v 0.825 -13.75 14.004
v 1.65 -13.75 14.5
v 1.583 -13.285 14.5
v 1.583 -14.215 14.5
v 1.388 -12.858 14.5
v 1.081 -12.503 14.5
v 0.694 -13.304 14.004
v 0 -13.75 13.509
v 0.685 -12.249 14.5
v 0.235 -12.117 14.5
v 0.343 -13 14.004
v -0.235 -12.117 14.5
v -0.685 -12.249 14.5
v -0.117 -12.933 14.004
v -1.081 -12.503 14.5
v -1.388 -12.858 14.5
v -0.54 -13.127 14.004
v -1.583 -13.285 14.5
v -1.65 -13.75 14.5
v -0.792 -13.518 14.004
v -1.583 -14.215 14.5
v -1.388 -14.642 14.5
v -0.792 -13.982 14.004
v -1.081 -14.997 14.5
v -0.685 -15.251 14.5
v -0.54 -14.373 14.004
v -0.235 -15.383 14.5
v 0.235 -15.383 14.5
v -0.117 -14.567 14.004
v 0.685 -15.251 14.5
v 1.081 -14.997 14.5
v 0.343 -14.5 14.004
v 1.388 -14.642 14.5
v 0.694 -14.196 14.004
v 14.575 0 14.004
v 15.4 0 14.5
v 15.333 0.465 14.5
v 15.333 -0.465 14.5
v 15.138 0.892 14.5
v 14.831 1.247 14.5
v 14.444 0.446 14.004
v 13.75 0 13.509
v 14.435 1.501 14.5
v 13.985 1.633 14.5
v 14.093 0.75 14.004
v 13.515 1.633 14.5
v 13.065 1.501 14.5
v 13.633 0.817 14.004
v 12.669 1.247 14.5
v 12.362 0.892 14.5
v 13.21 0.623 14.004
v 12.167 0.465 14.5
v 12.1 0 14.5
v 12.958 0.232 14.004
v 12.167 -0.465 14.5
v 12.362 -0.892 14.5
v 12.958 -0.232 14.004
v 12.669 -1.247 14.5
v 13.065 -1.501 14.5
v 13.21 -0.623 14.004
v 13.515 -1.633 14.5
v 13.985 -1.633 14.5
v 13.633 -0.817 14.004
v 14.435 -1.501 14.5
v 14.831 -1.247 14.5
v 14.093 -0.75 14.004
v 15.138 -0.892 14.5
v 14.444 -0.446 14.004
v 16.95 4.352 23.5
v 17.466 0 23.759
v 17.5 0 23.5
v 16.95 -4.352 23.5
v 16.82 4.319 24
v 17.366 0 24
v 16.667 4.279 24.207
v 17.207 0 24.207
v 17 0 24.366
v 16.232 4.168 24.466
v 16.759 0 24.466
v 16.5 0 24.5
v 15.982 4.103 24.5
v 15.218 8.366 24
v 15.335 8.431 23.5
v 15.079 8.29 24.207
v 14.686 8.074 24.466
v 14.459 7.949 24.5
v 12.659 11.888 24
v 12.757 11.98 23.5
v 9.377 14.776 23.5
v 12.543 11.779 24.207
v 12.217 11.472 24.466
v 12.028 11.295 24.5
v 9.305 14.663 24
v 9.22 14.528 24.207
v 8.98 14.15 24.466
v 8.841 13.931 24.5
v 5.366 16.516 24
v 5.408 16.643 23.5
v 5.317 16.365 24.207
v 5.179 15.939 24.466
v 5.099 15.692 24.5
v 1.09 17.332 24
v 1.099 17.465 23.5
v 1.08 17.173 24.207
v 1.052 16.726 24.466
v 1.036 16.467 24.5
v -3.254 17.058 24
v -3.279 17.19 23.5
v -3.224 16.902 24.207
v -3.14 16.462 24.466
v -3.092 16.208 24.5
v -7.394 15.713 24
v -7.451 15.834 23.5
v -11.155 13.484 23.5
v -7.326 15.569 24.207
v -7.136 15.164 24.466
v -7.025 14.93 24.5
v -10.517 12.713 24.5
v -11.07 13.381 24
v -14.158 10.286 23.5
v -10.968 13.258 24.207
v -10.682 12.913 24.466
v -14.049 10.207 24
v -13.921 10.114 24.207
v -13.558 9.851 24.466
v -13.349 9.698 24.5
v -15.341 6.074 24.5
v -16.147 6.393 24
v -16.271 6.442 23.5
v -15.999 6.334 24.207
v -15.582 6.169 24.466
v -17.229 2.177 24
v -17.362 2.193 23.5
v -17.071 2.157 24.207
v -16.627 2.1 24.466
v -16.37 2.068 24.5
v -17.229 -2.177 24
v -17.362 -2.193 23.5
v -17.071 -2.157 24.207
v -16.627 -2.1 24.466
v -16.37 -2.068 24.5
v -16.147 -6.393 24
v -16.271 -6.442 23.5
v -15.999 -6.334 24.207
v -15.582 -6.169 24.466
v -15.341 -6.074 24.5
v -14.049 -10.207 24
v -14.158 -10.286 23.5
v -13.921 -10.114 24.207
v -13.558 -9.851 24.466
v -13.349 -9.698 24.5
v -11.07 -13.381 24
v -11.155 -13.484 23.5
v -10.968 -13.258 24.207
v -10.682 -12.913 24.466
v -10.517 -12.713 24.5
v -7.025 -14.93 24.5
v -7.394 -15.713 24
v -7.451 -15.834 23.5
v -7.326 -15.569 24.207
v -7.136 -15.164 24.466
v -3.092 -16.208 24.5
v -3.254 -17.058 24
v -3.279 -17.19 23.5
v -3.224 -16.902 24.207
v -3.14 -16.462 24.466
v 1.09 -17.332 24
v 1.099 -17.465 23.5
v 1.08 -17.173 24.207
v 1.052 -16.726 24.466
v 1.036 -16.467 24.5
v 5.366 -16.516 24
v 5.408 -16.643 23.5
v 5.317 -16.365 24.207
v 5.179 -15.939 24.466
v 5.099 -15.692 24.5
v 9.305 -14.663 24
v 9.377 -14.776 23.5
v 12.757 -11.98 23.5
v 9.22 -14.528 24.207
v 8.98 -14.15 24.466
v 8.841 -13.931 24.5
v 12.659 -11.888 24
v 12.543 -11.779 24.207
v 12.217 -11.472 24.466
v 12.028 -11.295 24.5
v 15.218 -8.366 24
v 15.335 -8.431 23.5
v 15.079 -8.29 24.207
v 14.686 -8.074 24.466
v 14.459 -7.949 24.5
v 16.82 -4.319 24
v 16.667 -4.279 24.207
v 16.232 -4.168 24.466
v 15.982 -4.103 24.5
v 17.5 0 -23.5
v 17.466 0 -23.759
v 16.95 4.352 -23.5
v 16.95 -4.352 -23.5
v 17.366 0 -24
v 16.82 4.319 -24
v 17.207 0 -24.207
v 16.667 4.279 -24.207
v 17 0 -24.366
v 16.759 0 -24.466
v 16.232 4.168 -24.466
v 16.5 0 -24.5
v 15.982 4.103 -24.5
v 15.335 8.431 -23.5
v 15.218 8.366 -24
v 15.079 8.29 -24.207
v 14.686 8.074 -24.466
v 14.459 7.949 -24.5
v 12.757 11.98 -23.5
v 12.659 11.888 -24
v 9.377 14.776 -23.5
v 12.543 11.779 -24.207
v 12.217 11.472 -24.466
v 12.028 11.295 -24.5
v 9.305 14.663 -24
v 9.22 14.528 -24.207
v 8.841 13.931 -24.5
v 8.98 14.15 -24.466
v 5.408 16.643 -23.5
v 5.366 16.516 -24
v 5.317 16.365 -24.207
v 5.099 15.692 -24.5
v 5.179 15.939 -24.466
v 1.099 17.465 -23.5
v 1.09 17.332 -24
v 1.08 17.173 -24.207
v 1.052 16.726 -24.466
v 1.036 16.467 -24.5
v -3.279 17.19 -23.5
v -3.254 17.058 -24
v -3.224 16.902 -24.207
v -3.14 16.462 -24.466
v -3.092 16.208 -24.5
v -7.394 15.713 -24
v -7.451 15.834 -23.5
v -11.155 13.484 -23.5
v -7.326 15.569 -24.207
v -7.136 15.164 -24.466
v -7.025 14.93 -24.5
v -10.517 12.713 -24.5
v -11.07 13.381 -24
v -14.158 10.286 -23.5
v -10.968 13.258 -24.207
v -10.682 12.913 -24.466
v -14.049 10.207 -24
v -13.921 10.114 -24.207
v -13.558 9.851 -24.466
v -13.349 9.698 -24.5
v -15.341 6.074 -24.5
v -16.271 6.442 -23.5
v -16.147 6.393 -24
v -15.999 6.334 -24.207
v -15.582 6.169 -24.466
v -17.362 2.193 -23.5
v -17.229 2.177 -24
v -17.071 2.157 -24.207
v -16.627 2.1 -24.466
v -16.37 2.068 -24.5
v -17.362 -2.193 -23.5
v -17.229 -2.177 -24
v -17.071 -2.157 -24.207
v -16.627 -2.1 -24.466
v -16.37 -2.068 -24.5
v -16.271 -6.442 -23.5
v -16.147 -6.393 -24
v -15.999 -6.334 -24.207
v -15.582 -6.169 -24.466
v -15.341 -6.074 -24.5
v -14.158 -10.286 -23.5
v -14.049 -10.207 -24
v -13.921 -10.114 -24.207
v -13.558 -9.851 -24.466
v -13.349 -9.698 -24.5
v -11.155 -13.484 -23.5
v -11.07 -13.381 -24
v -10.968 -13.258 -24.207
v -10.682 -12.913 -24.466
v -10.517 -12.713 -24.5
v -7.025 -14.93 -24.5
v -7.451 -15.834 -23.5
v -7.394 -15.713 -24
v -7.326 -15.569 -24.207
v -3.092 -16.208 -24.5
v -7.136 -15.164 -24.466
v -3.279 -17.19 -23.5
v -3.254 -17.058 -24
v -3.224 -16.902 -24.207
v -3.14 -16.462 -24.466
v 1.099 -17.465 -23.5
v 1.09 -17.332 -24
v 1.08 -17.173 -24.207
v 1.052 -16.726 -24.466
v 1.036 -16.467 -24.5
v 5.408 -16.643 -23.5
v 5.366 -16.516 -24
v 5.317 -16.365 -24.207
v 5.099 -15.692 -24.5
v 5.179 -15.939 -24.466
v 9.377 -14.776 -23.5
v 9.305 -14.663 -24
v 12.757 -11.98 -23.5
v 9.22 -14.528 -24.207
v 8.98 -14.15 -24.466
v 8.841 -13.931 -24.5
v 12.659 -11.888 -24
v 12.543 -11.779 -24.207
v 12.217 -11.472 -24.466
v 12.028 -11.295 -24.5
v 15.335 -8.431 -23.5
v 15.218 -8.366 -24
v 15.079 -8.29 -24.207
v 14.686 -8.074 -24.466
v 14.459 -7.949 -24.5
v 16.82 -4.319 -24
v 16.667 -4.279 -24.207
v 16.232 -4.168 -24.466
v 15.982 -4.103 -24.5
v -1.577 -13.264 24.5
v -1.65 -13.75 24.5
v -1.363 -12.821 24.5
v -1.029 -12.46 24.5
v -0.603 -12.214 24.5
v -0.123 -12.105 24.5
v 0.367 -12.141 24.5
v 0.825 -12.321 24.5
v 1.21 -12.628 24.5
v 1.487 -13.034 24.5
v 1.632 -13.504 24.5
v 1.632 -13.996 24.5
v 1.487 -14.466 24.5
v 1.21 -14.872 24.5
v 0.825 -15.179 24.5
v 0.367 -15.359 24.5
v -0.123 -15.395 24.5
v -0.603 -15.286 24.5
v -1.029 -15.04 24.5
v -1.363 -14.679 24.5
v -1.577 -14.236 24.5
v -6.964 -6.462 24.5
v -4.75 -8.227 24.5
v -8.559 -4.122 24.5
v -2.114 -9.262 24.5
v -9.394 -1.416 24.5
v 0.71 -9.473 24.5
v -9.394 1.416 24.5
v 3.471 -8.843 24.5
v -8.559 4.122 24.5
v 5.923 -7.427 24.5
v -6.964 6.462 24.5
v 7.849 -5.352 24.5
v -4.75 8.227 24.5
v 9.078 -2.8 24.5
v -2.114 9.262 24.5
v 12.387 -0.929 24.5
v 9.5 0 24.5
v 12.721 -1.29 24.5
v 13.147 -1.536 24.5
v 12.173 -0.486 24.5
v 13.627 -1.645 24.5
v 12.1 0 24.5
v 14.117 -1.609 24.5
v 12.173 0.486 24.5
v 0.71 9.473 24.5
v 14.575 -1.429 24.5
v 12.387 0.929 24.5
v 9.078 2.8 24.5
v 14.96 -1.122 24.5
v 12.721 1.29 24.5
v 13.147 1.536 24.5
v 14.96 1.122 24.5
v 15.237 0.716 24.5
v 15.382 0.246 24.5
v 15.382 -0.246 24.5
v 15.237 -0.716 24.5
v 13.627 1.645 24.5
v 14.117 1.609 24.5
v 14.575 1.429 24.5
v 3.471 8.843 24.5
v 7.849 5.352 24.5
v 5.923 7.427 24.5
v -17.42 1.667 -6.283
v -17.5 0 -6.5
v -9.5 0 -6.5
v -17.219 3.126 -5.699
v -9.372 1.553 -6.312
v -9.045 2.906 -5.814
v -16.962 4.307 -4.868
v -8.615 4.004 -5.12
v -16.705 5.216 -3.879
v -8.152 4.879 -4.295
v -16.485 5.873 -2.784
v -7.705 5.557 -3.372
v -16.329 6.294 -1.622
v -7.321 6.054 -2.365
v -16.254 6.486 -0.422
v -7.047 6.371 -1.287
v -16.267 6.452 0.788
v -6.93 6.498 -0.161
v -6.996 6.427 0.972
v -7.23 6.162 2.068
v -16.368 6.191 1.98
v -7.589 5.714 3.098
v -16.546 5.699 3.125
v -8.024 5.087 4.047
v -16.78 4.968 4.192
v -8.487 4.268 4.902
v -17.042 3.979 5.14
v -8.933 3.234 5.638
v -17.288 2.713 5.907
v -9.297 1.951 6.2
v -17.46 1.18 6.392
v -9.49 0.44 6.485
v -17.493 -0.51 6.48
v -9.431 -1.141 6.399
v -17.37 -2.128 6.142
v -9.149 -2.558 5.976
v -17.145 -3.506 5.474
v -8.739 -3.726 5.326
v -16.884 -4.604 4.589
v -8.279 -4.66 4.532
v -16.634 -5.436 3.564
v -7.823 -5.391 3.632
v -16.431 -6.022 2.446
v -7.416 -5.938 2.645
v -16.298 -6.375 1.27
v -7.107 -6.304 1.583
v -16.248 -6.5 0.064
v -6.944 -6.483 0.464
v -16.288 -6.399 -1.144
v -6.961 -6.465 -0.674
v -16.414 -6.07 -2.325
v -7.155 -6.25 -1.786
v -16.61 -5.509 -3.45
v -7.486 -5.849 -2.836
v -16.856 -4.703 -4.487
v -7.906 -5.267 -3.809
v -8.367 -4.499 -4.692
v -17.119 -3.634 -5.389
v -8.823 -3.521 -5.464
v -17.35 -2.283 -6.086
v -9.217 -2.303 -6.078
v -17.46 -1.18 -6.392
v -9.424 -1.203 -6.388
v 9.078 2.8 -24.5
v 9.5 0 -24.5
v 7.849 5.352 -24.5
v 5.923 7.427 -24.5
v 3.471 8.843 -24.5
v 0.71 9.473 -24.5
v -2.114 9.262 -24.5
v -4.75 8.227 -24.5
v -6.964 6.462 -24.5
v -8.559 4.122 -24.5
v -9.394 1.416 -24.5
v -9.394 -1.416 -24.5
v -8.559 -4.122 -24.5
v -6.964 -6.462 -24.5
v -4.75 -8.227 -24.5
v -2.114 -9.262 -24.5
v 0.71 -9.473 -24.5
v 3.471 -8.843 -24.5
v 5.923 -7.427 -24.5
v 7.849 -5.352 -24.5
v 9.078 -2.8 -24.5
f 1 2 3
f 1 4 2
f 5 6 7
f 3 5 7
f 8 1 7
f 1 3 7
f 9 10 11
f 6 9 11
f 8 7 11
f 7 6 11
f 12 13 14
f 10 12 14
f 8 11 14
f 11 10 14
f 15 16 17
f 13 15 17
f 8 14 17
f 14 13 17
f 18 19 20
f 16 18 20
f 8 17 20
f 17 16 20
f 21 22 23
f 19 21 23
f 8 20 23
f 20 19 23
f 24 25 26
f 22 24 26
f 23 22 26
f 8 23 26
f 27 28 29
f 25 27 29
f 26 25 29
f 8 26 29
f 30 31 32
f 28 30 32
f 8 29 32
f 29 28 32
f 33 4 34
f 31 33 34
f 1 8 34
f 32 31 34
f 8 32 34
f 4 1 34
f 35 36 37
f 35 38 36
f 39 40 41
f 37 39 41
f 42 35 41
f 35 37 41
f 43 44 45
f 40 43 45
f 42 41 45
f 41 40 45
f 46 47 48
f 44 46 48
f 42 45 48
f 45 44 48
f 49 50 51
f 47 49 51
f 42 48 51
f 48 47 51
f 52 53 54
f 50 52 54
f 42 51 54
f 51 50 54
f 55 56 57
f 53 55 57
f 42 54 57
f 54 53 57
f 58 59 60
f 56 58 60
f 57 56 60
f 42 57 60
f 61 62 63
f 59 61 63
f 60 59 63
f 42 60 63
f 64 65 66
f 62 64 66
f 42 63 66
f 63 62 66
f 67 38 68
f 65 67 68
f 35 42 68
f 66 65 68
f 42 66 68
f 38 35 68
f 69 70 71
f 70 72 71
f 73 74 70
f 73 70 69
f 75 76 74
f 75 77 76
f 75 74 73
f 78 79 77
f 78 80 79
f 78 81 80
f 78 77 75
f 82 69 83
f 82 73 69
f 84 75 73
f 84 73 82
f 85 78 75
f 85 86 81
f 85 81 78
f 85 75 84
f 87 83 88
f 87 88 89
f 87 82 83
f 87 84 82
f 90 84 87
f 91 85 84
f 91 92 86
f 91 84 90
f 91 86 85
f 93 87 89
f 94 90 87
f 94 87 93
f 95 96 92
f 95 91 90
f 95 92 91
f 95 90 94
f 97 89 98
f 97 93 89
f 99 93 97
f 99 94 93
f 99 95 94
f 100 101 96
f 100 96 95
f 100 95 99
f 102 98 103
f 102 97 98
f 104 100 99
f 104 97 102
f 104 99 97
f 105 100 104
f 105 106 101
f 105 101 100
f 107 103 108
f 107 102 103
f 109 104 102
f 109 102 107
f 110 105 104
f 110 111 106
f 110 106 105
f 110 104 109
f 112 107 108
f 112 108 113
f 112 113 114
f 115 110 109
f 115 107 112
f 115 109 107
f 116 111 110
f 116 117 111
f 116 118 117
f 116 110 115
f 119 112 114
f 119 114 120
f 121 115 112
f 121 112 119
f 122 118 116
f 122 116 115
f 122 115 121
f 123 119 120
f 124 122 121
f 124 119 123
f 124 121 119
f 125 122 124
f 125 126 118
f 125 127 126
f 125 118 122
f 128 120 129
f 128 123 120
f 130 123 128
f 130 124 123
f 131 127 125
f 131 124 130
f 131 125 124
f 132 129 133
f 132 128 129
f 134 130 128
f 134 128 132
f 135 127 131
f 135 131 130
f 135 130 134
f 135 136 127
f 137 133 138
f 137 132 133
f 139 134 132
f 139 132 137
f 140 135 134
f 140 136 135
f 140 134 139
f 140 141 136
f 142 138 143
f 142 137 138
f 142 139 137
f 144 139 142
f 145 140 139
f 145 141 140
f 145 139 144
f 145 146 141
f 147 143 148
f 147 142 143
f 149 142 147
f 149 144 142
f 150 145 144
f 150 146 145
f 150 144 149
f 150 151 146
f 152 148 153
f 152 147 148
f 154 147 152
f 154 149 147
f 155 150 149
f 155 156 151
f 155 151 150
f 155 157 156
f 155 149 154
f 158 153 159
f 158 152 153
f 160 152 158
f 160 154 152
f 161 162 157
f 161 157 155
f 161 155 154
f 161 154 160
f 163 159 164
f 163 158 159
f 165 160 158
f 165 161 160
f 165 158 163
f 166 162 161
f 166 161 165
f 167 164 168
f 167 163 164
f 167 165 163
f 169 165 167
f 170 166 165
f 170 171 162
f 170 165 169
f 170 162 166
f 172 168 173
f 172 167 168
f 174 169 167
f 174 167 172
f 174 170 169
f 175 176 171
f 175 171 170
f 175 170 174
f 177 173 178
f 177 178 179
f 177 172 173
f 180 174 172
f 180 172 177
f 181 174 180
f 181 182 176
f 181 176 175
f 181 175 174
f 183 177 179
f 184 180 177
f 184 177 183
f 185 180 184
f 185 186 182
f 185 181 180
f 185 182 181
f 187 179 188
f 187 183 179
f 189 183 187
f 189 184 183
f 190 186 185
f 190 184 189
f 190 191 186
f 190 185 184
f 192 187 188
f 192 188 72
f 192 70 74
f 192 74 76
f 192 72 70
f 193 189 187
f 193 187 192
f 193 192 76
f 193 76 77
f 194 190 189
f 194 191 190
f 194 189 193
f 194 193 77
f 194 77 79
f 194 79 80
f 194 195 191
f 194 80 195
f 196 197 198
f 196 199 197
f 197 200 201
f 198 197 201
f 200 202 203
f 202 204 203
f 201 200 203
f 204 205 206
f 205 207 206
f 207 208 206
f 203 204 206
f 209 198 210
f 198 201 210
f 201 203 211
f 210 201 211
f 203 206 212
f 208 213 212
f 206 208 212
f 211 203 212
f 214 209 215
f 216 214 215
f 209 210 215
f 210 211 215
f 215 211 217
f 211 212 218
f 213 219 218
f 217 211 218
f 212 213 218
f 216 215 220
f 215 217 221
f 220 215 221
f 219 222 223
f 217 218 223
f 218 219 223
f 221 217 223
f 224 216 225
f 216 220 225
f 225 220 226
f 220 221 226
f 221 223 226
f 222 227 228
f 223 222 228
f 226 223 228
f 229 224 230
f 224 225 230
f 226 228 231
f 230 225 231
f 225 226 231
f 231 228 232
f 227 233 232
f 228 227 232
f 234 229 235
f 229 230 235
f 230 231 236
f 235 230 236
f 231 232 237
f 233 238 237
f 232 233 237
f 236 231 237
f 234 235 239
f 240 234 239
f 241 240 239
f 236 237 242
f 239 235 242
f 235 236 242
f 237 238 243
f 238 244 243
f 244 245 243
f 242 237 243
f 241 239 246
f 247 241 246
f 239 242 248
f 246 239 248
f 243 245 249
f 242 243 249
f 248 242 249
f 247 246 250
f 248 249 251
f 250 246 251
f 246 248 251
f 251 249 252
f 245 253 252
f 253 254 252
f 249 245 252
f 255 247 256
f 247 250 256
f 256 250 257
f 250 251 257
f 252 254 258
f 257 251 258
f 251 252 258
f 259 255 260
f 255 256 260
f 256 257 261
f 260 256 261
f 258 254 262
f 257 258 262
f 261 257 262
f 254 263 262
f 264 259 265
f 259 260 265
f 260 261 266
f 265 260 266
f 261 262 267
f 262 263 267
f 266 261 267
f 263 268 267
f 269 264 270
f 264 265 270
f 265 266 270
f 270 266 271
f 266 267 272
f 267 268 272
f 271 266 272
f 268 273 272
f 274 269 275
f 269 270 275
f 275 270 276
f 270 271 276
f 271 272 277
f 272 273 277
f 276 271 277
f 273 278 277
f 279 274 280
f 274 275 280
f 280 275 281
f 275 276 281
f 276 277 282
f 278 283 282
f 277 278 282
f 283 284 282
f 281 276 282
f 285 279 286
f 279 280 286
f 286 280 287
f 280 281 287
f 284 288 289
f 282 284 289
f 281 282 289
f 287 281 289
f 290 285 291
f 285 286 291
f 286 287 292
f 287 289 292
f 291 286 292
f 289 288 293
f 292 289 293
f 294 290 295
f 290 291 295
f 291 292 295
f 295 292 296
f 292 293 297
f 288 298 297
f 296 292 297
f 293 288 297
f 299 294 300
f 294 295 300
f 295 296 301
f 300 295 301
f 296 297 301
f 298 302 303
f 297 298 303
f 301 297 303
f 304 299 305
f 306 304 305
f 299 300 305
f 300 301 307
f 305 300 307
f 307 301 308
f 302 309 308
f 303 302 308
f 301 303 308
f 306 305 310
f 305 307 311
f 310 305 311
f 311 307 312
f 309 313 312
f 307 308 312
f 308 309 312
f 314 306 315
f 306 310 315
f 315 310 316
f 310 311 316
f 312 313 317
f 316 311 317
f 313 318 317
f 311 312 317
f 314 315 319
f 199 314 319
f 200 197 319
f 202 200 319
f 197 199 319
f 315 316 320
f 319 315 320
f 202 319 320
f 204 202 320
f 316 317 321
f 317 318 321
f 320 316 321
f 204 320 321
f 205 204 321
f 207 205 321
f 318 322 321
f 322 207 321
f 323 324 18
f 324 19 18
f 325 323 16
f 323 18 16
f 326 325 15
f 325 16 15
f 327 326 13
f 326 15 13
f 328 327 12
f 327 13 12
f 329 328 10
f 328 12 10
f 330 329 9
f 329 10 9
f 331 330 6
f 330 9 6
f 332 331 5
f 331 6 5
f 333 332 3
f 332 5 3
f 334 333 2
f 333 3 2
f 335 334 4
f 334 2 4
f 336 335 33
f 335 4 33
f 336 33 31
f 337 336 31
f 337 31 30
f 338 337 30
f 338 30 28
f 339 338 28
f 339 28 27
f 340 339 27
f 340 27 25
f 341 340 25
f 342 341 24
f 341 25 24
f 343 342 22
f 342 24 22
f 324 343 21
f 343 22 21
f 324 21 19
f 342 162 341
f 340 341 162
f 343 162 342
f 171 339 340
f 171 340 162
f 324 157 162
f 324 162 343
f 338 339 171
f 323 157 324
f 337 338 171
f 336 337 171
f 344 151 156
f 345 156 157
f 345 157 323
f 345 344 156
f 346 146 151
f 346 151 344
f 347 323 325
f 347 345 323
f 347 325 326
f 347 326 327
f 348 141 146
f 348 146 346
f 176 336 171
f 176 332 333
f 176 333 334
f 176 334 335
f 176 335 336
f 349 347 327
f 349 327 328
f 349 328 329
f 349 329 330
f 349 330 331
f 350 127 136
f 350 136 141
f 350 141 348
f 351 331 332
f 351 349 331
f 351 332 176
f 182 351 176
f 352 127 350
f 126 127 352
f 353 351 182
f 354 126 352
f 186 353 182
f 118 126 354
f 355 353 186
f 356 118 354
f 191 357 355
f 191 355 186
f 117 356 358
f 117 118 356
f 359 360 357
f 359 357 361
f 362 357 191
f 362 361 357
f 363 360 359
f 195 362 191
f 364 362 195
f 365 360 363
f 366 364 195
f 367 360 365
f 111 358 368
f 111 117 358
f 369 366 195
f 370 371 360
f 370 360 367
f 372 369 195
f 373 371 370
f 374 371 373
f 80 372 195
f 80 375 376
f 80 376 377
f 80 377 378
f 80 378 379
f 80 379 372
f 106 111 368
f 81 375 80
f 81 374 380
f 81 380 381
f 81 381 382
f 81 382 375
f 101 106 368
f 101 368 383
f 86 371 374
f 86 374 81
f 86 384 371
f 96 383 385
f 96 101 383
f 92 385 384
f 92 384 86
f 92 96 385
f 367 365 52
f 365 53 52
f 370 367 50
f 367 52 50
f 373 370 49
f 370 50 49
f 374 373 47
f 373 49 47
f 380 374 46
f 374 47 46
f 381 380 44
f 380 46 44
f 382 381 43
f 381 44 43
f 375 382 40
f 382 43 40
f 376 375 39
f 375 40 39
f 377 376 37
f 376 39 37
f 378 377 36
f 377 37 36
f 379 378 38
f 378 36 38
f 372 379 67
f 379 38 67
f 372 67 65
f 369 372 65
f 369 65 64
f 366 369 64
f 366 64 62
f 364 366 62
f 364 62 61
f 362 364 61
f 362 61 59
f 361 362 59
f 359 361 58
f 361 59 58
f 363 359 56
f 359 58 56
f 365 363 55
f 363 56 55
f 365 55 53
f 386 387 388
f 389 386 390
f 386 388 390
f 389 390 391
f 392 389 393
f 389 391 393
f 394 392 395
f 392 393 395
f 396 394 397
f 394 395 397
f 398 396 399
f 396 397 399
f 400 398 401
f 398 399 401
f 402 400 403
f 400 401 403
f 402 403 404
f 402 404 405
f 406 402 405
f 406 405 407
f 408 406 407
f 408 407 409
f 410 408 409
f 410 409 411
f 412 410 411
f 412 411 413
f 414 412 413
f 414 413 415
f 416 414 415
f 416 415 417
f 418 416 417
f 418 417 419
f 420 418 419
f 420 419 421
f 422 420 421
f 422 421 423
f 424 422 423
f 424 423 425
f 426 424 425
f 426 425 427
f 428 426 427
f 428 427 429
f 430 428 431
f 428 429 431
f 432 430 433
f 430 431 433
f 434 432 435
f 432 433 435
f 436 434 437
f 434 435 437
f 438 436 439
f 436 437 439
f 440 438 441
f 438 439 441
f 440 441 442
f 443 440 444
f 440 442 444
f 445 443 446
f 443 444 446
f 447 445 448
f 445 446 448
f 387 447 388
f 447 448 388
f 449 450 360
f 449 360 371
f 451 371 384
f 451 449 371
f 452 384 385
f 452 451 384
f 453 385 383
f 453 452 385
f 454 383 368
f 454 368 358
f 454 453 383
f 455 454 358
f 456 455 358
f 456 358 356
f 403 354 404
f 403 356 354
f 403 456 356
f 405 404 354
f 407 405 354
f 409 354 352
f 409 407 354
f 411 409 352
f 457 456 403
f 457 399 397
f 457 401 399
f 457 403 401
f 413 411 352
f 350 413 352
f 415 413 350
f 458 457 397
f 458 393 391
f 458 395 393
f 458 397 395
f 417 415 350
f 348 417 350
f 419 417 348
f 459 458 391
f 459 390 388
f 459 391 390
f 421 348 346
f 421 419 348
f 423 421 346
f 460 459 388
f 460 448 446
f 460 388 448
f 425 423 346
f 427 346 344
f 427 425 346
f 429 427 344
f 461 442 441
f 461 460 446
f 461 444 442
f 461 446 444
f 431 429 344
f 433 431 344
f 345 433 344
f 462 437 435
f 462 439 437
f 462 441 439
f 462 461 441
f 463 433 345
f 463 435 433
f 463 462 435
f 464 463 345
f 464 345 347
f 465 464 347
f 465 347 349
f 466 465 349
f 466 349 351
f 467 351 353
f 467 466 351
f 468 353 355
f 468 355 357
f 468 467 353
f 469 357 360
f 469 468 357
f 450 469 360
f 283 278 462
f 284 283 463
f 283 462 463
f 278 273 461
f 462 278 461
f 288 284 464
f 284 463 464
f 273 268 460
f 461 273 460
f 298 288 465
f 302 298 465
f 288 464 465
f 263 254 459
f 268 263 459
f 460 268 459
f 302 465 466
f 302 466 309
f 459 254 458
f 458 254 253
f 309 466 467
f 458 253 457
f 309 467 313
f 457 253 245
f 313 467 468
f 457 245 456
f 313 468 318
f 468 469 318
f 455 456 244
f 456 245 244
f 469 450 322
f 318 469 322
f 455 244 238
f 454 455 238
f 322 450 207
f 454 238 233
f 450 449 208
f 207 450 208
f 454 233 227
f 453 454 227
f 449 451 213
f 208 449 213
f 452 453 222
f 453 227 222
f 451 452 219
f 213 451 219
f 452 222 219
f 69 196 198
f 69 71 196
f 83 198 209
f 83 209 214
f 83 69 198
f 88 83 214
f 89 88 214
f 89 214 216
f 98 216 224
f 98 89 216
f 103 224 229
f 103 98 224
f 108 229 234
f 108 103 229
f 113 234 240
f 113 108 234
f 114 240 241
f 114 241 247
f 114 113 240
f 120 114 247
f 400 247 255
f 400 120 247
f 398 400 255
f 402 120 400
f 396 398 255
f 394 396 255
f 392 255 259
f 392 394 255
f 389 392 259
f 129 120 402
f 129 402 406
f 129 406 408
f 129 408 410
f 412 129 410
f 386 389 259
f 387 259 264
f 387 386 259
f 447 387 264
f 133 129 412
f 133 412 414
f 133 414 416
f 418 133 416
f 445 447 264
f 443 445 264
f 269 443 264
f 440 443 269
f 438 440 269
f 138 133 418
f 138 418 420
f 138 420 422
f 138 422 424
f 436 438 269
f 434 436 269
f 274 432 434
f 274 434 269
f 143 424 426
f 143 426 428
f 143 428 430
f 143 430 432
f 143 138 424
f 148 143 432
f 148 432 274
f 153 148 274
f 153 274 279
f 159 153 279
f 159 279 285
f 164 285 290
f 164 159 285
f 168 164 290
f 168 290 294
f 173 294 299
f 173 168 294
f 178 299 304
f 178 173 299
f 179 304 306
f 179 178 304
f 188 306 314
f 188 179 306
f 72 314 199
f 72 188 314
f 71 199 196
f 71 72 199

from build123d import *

# Parameters (mm, degrees)
ESBO_O1_R                 = 17.5
ESBO_O1_R_2               = 9.5
RESSALTO_EXTRUS_O1_DEPTH  = 24.5
FILETE1_R                 = 1
ESBO_O2_R                 = 6.5
CORTE_EXTRUS_O1_DEPTH     = 35.824560299
FURO_ROSCADO_DE_M41_D     = 3.3
FURO_ROSCADO_DE_M41_DEPTH = 10
FURO_ROSCADO_DE_M41_TIP   = 0.991420021


with BuildPart() as part:
    # Esboço1 → Ressalto-extrusão1 (new, symmetric)
    with BuildSketch(Plane.XY):
        Circle(ESBO_O1_R)
        Circle(ESBO_O1_R_2, mode=Mode.SUBTRACT)
    extrude(amount=RESSALTO_EXTRUS_O1_DEPTH, both=True)

    # Filete1
    filete1_edges = [part.edges().sort_by_distance(p)[0] for p in [
        (-17.5, 0, -24.5),
        (-17.5, 0, 24.5),
    ]]
    fillet(filete1_edges, radius=FILETE1_R)

    # Esboço2 → Corte-extrusão1 (cut, through all)
    with BuildSketch(Plane(origin=(0, 0, 0), x_dir=(0, 0, -1), z_dir=(1, 0, 0))):
        Circle(ESBO_O2_R)
    extrude(amount=-CORTE_EXTRUS_O1_DEPTH, mode=Mode.SUBTRACT)

    # Furo roscado de M41
    with Locations(Plane.XY.offset(24.5)):
        with Locations((13.75, 0), (0, -13.75)):
            Hole(FURO_ROSCADO_DE_M41_D / 2, depth=FURO_ROSCADO_DE_M41_DEPTH)
            with Locations((0, 0, -(FURO_ROSCADO_DE_M41_DEPTH + FURO_ROSCADO_DE_M41_TIP / 2))):  # 118° drill point
                Cone(0, FURO_ROSCADO_DE_M41_D / 2, FURO_ROSCADO_DE_M41_TIP, mode=Mode.SUBTRACT)


solid = part.part
